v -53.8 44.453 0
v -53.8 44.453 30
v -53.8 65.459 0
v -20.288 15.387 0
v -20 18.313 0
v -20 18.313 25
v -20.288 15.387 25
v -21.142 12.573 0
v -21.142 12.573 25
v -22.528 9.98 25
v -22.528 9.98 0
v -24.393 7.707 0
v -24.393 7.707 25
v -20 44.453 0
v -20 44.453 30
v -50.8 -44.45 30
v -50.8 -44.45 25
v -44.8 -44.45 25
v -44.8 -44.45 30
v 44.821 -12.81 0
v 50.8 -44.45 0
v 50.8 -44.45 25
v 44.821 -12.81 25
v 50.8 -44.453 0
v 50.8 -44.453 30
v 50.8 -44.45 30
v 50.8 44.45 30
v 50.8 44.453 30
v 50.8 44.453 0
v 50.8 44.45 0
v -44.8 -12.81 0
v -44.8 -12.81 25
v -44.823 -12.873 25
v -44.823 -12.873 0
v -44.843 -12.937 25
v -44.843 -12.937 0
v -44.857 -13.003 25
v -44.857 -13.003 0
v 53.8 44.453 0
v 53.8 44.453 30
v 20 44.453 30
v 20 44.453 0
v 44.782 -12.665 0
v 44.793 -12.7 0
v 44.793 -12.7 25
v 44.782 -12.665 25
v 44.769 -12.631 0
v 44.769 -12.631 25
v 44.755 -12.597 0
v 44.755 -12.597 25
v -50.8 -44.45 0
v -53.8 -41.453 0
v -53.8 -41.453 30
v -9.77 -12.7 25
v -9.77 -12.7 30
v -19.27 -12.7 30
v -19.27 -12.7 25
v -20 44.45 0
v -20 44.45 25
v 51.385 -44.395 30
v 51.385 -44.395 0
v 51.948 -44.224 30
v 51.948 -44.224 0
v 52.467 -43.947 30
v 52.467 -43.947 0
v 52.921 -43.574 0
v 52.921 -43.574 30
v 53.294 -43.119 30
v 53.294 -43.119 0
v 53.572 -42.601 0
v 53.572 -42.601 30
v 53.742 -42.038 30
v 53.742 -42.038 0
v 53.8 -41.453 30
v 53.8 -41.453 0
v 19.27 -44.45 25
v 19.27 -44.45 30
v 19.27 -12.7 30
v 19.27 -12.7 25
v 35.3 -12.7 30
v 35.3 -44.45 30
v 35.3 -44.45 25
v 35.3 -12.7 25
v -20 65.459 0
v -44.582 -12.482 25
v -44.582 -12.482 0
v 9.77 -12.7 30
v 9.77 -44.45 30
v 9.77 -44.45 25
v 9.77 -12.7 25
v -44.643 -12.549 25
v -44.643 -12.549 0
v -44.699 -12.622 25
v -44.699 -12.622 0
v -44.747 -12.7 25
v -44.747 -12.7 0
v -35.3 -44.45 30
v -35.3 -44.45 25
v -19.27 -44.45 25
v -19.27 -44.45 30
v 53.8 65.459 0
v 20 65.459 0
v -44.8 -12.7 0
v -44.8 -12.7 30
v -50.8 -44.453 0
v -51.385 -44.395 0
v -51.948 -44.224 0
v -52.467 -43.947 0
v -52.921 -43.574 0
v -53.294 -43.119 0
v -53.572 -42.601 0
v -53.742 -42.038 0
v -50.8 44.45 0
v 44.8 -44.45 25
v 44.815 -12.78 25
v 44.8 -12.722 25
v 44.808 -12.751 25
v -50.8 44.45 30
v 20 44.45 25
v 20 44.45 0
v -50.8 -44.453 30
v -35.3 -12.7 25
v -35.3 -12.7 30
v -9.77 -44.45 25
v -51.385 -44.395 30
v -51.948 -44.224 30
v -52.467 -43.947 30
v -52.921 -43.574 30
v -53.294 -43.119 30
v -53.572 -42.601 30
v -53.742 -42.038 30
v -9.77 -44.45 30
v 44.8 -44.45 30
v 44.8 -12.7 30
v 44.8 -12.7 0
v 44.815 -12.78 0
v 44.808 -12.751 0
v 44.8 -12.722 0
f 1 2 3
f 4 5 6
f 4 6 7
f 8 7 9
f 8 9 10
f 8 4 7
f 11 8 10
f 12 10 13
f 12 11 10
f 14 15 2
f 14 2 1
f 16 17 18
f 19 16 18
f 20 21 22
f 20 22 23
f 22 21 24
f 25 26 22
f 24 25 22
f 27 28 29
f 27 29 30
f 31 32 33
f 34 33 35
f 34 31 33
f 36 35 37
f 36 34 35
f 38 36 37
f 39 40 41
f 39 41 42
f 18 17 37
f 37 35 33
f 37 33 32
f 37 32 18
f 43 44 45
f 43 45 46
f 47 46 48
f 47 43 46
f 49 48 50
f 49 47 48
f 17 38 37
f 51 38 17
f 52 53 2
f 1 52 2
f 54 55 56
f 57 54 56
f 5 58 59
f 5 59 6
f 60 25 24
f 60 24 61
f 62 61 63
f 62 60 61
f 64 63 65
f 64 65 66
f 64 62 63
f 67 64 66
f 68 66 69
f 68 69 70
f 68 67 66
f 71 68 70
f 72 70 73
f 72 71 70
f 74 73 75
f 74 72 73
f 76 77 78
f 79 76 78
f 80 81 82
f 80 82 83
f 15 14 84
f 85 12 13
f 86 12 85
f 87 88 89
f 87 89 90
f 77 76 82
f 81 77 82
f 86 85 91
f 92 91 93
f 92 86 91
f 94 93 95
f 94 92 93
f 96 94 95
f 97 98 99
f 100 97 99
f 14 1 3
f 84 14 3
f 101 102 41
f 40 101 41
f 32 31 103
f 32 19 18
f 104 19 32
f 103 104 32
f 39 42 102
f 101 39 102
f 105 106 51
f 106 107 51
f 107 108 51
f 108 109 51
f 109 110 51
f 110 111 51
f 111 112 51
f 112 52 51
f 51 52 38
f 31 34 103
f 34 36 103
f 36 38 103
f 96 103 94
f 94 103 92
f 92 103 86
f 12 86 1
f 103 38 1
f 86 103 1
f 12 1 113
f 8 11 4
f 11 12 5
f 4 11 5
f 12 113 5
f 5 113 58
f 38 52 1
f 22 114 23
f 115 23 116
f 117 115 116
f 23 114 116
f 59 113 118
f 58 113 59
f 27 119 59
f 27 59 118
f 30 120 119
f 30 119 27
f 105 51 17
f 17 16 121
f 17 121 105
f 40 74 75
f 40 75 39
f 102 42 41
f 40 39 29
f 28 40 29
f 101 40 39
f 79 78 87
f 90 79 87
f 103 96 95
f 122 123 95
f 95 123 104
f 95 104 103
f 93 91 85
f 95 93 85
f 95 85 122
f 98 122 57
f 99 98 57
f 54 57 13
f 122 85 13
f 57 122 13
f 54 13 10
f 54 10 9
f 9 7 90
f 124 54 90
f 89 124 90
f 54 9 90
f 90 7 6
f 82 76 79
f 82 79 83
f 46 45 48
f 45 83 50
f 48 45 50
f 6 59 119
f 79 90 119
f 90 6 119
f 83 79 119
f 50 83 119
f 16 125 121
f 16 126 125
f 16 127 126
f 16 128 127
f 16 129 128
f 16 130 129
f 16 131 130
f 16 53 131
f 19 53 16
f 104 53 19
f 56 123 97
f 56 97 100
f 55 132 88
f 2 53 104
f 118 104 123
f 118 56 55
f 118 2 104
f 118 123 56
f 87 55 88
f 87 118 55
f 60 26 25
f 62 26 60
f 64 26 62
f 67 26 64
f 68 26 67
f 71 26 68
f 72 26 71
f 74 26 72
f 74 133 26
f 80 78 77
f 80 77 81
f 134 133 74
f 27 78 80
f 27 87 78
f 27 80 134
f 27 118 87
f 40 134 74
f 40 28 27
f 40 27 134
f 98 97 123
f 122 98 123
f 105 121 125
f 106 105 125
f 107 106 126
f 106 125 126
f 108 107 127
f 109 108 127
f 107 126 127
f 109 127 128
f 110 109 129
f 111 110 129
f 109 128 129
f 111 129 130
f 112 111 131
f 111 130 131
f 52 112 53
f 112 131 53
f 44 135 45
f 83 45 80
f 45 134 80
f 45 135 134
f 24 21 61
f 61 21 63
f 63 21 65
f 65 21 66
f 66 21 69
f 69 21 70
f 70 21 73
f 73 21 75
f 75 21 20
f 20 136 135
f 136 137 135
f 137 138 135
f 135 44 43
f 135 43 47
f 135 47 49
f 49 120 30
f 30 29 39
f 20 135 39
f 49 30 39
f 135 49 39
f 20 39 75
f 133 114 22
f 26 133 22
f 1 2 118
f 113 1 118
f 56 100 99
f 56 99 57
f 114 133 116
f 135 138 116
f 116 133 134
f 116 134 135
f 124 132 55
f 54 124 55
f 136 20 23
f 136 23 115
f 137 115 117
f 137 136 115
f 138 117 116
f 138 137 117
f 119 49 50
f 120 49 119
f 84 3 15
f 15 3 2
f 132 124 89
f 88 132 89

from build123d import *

# Parameters (mm, degrees)
SKETCH4_W                = 101.6
SKETCH4_H                = 88.9
BOSS_EXTRUDE3_DEPTH      = 30
SKETCH7_W                = 9.5
SKETCH7_H                = 31.75
CUT_EXTRUDE5_DEPTH       = 72.982237392
CUT_EXTRUDE5_DEPTH_BACK  = 72.982237392
CUT_EXTRUDE6_DEPTH       = 74.86773653
CUT_EXTRUDE6_DEPTH_BACK  = 25
BOSS_EXTRUDE4_DEPTH      = 30
BOSS_EXTRUDE6_DEPTH      = 107.6
SKETCH11_W               = 40
SKETCH11_H               = 21.008754769
CUT_EXTRUDE10_DEPTH      = 90.884862885
CUT_EXTRUDE10_DEPTH_BACK = 90.884862885


with BuildPart() as part:
    # Sketch4 → Boss-Extrude3 (new body)
    with BuildSketch(Plane.XY):
        Rectangle(SKETCH4_W, SKETCH4_H)
    extrude(amount=BOSS_EXTRUDE3_DEPTH)

    # Sketch7 → Cut-Extrude5 (cut, two sides)
    with BuildSketch(Plane(origin=(0, 0, 25), x_dir=(-1, 0, 0), z_dir=(0, 0, -1))) as cut_extrude5_sk:
        with Locations((40.05, -28.575)):
            Rectangle(SKETCH7_W, SKETCH7_H)
        with Locations((-40.05, -28.575)):
            Rectangle(SKETCH7_W, SKETCH7_H)
        with Locations((-14.52, -28.575)):
            Rectangle(SKETCH7_W, SKETCH7_H)
        with Locations((14.52, -28.575)):
            Rectangle(SKETCH7_W, SKETCH7_H)
    extrude(amount=CUT_EXTRUDE5_DEPTH, mode=Mode.SUBTRACT)
    extrude(cut_extrude5_sk.sketch, amount=-CUT_EXTRUDE5_DEPTH_BACK, mode=Mode.SUBTRACT)

    # Sketch8 → Cut-Extrude6 (cut, two sides)
    with BuildSketch(Plane(origin=(0, 0, 0), x_dir=(-1, 0, 0), z_dir=(0, 0, -1))) as cut_extrude6_sk:
        with BuildLine():
            Line((-50.8, -44.45), (-44.820757692, -12.809842787))
            ThreePointArc((-44.820757692, -12.809842787), (-44.794045948, -12.701829407), (-44.755499814, -12.597452192))
            Line((-44.755499814, -12.597452192), (-20, 44.45))
            Line((-20, 44.45), (20, 44.45))
            Line((20, 44.45), (20, 18.313203436))
            ThreePointArc((20, 18.313203436), (21.141807012, 12.57295195), (24.393398282, 7.706601718))
            Line((24.393398282, 7.706601718), (44.581799029, -12.481799029))
            ThreePointArc((44.581799029, -12.481799029), (44.758860381, -12.721736983), (44.857300667, -13.00321603))
            Line((44.857300667, -13.00321603), (50.8, -44.45))
            Line((50.8, -44.45), (-50.8, -44.45))
        make_face()
    extrude(amount=CUT_EXTRUDE6_DEPTH, mode=Mode.SUBTRACT)
    extrude(cut_extrude6_sk.sketch, amount=-CUT_EXTRUDE6_DEPTH_BACK, mode=Mode.SUBTRACT)

    # Sketch9 → Boss-Extrude4 (add)
    with BuildSketch(Plane.XY.offset(30)):
        with BuildLine():
            Line((53.8, -41.452528622), (53.8, 44.452528622))
            Line((53.8, 44.452528622), (50.8, 44.452528622))
            Line((50.8, 44.452528622), (50.8, -44.452528622))
            ThreePointArc((50.8, -44.452528622), (52.921320344, -43.573848966), (53.8, -41.452528622))
        make_face()
        with BuildLine():
            Line((-53.8, -41.452528622), (-53.8, 44.452528622))
            Line((-53.8, 44.452528622), (-50.8, 44.45))
            Line((-50.8, 44.45), (-50.8, -44.452528622))
            ThreePointArc((-50.8, -44.452528622), (-52.921320344, -43.573848966), (-53.8, -41.452528622))
        make_face()
    extrude(amount=-BOSS_EXTRUDE4_DEPTH)


with BuildPart() as body_2:
    # Sketch10 → Boss-Extrude6 (new body)
    with BuildSketch(Plane.ZY.offset(53.8)):
        Polygon((0, 44.452528622), (0, 65.458754769), (30, 44.452528622), align=None)
    extrude(amount=-BOSS_EXTRUDE6_DEPTH)

    # Sketch11 → Cut-Extrude10 (cut, two sides)
    with BuildSketch(Plane(origin=(0, 0, 0), x_dir=(-1, 0, 0), z_dir=(0, 0, -1))) as cut_extrude10_sk:
        with Locations((0, 54.954377385)):
            Rectangle(SKETCH11_W, SKETCH11_H)
    extrude(amount=CUT_EXTRUDE10_DEPTH, mode=Mode.SUBTRACT)
    extrude(cut_extrude10_sk.sketch, amount=-CUT_EXTRUDE10_DEPTH_BACK, mode=Mode.SUBTRACT)


with BuildPart() as cut_extrude10_piece_1:
    # of the separate pieces the step leaves, piece 1, a body of its own (cut_extrude10_pieces)
    add(body_2.part.solids().sort_by_distance((20, 65.458754769, 0))[0])


with BuildPart() as cut_extrude10_piece_2:
    # of the separate pieces the step leaves, piece 2, a body of its own (cut_extrude10_pieces)
    add(body_2.part.solids().sort_by_distance((-53.8, 44.452528622, 0))[0])


solid = Compound([part.part, cut_extrude10_piece_1.part, cut_extrude10_piece_2.part])
